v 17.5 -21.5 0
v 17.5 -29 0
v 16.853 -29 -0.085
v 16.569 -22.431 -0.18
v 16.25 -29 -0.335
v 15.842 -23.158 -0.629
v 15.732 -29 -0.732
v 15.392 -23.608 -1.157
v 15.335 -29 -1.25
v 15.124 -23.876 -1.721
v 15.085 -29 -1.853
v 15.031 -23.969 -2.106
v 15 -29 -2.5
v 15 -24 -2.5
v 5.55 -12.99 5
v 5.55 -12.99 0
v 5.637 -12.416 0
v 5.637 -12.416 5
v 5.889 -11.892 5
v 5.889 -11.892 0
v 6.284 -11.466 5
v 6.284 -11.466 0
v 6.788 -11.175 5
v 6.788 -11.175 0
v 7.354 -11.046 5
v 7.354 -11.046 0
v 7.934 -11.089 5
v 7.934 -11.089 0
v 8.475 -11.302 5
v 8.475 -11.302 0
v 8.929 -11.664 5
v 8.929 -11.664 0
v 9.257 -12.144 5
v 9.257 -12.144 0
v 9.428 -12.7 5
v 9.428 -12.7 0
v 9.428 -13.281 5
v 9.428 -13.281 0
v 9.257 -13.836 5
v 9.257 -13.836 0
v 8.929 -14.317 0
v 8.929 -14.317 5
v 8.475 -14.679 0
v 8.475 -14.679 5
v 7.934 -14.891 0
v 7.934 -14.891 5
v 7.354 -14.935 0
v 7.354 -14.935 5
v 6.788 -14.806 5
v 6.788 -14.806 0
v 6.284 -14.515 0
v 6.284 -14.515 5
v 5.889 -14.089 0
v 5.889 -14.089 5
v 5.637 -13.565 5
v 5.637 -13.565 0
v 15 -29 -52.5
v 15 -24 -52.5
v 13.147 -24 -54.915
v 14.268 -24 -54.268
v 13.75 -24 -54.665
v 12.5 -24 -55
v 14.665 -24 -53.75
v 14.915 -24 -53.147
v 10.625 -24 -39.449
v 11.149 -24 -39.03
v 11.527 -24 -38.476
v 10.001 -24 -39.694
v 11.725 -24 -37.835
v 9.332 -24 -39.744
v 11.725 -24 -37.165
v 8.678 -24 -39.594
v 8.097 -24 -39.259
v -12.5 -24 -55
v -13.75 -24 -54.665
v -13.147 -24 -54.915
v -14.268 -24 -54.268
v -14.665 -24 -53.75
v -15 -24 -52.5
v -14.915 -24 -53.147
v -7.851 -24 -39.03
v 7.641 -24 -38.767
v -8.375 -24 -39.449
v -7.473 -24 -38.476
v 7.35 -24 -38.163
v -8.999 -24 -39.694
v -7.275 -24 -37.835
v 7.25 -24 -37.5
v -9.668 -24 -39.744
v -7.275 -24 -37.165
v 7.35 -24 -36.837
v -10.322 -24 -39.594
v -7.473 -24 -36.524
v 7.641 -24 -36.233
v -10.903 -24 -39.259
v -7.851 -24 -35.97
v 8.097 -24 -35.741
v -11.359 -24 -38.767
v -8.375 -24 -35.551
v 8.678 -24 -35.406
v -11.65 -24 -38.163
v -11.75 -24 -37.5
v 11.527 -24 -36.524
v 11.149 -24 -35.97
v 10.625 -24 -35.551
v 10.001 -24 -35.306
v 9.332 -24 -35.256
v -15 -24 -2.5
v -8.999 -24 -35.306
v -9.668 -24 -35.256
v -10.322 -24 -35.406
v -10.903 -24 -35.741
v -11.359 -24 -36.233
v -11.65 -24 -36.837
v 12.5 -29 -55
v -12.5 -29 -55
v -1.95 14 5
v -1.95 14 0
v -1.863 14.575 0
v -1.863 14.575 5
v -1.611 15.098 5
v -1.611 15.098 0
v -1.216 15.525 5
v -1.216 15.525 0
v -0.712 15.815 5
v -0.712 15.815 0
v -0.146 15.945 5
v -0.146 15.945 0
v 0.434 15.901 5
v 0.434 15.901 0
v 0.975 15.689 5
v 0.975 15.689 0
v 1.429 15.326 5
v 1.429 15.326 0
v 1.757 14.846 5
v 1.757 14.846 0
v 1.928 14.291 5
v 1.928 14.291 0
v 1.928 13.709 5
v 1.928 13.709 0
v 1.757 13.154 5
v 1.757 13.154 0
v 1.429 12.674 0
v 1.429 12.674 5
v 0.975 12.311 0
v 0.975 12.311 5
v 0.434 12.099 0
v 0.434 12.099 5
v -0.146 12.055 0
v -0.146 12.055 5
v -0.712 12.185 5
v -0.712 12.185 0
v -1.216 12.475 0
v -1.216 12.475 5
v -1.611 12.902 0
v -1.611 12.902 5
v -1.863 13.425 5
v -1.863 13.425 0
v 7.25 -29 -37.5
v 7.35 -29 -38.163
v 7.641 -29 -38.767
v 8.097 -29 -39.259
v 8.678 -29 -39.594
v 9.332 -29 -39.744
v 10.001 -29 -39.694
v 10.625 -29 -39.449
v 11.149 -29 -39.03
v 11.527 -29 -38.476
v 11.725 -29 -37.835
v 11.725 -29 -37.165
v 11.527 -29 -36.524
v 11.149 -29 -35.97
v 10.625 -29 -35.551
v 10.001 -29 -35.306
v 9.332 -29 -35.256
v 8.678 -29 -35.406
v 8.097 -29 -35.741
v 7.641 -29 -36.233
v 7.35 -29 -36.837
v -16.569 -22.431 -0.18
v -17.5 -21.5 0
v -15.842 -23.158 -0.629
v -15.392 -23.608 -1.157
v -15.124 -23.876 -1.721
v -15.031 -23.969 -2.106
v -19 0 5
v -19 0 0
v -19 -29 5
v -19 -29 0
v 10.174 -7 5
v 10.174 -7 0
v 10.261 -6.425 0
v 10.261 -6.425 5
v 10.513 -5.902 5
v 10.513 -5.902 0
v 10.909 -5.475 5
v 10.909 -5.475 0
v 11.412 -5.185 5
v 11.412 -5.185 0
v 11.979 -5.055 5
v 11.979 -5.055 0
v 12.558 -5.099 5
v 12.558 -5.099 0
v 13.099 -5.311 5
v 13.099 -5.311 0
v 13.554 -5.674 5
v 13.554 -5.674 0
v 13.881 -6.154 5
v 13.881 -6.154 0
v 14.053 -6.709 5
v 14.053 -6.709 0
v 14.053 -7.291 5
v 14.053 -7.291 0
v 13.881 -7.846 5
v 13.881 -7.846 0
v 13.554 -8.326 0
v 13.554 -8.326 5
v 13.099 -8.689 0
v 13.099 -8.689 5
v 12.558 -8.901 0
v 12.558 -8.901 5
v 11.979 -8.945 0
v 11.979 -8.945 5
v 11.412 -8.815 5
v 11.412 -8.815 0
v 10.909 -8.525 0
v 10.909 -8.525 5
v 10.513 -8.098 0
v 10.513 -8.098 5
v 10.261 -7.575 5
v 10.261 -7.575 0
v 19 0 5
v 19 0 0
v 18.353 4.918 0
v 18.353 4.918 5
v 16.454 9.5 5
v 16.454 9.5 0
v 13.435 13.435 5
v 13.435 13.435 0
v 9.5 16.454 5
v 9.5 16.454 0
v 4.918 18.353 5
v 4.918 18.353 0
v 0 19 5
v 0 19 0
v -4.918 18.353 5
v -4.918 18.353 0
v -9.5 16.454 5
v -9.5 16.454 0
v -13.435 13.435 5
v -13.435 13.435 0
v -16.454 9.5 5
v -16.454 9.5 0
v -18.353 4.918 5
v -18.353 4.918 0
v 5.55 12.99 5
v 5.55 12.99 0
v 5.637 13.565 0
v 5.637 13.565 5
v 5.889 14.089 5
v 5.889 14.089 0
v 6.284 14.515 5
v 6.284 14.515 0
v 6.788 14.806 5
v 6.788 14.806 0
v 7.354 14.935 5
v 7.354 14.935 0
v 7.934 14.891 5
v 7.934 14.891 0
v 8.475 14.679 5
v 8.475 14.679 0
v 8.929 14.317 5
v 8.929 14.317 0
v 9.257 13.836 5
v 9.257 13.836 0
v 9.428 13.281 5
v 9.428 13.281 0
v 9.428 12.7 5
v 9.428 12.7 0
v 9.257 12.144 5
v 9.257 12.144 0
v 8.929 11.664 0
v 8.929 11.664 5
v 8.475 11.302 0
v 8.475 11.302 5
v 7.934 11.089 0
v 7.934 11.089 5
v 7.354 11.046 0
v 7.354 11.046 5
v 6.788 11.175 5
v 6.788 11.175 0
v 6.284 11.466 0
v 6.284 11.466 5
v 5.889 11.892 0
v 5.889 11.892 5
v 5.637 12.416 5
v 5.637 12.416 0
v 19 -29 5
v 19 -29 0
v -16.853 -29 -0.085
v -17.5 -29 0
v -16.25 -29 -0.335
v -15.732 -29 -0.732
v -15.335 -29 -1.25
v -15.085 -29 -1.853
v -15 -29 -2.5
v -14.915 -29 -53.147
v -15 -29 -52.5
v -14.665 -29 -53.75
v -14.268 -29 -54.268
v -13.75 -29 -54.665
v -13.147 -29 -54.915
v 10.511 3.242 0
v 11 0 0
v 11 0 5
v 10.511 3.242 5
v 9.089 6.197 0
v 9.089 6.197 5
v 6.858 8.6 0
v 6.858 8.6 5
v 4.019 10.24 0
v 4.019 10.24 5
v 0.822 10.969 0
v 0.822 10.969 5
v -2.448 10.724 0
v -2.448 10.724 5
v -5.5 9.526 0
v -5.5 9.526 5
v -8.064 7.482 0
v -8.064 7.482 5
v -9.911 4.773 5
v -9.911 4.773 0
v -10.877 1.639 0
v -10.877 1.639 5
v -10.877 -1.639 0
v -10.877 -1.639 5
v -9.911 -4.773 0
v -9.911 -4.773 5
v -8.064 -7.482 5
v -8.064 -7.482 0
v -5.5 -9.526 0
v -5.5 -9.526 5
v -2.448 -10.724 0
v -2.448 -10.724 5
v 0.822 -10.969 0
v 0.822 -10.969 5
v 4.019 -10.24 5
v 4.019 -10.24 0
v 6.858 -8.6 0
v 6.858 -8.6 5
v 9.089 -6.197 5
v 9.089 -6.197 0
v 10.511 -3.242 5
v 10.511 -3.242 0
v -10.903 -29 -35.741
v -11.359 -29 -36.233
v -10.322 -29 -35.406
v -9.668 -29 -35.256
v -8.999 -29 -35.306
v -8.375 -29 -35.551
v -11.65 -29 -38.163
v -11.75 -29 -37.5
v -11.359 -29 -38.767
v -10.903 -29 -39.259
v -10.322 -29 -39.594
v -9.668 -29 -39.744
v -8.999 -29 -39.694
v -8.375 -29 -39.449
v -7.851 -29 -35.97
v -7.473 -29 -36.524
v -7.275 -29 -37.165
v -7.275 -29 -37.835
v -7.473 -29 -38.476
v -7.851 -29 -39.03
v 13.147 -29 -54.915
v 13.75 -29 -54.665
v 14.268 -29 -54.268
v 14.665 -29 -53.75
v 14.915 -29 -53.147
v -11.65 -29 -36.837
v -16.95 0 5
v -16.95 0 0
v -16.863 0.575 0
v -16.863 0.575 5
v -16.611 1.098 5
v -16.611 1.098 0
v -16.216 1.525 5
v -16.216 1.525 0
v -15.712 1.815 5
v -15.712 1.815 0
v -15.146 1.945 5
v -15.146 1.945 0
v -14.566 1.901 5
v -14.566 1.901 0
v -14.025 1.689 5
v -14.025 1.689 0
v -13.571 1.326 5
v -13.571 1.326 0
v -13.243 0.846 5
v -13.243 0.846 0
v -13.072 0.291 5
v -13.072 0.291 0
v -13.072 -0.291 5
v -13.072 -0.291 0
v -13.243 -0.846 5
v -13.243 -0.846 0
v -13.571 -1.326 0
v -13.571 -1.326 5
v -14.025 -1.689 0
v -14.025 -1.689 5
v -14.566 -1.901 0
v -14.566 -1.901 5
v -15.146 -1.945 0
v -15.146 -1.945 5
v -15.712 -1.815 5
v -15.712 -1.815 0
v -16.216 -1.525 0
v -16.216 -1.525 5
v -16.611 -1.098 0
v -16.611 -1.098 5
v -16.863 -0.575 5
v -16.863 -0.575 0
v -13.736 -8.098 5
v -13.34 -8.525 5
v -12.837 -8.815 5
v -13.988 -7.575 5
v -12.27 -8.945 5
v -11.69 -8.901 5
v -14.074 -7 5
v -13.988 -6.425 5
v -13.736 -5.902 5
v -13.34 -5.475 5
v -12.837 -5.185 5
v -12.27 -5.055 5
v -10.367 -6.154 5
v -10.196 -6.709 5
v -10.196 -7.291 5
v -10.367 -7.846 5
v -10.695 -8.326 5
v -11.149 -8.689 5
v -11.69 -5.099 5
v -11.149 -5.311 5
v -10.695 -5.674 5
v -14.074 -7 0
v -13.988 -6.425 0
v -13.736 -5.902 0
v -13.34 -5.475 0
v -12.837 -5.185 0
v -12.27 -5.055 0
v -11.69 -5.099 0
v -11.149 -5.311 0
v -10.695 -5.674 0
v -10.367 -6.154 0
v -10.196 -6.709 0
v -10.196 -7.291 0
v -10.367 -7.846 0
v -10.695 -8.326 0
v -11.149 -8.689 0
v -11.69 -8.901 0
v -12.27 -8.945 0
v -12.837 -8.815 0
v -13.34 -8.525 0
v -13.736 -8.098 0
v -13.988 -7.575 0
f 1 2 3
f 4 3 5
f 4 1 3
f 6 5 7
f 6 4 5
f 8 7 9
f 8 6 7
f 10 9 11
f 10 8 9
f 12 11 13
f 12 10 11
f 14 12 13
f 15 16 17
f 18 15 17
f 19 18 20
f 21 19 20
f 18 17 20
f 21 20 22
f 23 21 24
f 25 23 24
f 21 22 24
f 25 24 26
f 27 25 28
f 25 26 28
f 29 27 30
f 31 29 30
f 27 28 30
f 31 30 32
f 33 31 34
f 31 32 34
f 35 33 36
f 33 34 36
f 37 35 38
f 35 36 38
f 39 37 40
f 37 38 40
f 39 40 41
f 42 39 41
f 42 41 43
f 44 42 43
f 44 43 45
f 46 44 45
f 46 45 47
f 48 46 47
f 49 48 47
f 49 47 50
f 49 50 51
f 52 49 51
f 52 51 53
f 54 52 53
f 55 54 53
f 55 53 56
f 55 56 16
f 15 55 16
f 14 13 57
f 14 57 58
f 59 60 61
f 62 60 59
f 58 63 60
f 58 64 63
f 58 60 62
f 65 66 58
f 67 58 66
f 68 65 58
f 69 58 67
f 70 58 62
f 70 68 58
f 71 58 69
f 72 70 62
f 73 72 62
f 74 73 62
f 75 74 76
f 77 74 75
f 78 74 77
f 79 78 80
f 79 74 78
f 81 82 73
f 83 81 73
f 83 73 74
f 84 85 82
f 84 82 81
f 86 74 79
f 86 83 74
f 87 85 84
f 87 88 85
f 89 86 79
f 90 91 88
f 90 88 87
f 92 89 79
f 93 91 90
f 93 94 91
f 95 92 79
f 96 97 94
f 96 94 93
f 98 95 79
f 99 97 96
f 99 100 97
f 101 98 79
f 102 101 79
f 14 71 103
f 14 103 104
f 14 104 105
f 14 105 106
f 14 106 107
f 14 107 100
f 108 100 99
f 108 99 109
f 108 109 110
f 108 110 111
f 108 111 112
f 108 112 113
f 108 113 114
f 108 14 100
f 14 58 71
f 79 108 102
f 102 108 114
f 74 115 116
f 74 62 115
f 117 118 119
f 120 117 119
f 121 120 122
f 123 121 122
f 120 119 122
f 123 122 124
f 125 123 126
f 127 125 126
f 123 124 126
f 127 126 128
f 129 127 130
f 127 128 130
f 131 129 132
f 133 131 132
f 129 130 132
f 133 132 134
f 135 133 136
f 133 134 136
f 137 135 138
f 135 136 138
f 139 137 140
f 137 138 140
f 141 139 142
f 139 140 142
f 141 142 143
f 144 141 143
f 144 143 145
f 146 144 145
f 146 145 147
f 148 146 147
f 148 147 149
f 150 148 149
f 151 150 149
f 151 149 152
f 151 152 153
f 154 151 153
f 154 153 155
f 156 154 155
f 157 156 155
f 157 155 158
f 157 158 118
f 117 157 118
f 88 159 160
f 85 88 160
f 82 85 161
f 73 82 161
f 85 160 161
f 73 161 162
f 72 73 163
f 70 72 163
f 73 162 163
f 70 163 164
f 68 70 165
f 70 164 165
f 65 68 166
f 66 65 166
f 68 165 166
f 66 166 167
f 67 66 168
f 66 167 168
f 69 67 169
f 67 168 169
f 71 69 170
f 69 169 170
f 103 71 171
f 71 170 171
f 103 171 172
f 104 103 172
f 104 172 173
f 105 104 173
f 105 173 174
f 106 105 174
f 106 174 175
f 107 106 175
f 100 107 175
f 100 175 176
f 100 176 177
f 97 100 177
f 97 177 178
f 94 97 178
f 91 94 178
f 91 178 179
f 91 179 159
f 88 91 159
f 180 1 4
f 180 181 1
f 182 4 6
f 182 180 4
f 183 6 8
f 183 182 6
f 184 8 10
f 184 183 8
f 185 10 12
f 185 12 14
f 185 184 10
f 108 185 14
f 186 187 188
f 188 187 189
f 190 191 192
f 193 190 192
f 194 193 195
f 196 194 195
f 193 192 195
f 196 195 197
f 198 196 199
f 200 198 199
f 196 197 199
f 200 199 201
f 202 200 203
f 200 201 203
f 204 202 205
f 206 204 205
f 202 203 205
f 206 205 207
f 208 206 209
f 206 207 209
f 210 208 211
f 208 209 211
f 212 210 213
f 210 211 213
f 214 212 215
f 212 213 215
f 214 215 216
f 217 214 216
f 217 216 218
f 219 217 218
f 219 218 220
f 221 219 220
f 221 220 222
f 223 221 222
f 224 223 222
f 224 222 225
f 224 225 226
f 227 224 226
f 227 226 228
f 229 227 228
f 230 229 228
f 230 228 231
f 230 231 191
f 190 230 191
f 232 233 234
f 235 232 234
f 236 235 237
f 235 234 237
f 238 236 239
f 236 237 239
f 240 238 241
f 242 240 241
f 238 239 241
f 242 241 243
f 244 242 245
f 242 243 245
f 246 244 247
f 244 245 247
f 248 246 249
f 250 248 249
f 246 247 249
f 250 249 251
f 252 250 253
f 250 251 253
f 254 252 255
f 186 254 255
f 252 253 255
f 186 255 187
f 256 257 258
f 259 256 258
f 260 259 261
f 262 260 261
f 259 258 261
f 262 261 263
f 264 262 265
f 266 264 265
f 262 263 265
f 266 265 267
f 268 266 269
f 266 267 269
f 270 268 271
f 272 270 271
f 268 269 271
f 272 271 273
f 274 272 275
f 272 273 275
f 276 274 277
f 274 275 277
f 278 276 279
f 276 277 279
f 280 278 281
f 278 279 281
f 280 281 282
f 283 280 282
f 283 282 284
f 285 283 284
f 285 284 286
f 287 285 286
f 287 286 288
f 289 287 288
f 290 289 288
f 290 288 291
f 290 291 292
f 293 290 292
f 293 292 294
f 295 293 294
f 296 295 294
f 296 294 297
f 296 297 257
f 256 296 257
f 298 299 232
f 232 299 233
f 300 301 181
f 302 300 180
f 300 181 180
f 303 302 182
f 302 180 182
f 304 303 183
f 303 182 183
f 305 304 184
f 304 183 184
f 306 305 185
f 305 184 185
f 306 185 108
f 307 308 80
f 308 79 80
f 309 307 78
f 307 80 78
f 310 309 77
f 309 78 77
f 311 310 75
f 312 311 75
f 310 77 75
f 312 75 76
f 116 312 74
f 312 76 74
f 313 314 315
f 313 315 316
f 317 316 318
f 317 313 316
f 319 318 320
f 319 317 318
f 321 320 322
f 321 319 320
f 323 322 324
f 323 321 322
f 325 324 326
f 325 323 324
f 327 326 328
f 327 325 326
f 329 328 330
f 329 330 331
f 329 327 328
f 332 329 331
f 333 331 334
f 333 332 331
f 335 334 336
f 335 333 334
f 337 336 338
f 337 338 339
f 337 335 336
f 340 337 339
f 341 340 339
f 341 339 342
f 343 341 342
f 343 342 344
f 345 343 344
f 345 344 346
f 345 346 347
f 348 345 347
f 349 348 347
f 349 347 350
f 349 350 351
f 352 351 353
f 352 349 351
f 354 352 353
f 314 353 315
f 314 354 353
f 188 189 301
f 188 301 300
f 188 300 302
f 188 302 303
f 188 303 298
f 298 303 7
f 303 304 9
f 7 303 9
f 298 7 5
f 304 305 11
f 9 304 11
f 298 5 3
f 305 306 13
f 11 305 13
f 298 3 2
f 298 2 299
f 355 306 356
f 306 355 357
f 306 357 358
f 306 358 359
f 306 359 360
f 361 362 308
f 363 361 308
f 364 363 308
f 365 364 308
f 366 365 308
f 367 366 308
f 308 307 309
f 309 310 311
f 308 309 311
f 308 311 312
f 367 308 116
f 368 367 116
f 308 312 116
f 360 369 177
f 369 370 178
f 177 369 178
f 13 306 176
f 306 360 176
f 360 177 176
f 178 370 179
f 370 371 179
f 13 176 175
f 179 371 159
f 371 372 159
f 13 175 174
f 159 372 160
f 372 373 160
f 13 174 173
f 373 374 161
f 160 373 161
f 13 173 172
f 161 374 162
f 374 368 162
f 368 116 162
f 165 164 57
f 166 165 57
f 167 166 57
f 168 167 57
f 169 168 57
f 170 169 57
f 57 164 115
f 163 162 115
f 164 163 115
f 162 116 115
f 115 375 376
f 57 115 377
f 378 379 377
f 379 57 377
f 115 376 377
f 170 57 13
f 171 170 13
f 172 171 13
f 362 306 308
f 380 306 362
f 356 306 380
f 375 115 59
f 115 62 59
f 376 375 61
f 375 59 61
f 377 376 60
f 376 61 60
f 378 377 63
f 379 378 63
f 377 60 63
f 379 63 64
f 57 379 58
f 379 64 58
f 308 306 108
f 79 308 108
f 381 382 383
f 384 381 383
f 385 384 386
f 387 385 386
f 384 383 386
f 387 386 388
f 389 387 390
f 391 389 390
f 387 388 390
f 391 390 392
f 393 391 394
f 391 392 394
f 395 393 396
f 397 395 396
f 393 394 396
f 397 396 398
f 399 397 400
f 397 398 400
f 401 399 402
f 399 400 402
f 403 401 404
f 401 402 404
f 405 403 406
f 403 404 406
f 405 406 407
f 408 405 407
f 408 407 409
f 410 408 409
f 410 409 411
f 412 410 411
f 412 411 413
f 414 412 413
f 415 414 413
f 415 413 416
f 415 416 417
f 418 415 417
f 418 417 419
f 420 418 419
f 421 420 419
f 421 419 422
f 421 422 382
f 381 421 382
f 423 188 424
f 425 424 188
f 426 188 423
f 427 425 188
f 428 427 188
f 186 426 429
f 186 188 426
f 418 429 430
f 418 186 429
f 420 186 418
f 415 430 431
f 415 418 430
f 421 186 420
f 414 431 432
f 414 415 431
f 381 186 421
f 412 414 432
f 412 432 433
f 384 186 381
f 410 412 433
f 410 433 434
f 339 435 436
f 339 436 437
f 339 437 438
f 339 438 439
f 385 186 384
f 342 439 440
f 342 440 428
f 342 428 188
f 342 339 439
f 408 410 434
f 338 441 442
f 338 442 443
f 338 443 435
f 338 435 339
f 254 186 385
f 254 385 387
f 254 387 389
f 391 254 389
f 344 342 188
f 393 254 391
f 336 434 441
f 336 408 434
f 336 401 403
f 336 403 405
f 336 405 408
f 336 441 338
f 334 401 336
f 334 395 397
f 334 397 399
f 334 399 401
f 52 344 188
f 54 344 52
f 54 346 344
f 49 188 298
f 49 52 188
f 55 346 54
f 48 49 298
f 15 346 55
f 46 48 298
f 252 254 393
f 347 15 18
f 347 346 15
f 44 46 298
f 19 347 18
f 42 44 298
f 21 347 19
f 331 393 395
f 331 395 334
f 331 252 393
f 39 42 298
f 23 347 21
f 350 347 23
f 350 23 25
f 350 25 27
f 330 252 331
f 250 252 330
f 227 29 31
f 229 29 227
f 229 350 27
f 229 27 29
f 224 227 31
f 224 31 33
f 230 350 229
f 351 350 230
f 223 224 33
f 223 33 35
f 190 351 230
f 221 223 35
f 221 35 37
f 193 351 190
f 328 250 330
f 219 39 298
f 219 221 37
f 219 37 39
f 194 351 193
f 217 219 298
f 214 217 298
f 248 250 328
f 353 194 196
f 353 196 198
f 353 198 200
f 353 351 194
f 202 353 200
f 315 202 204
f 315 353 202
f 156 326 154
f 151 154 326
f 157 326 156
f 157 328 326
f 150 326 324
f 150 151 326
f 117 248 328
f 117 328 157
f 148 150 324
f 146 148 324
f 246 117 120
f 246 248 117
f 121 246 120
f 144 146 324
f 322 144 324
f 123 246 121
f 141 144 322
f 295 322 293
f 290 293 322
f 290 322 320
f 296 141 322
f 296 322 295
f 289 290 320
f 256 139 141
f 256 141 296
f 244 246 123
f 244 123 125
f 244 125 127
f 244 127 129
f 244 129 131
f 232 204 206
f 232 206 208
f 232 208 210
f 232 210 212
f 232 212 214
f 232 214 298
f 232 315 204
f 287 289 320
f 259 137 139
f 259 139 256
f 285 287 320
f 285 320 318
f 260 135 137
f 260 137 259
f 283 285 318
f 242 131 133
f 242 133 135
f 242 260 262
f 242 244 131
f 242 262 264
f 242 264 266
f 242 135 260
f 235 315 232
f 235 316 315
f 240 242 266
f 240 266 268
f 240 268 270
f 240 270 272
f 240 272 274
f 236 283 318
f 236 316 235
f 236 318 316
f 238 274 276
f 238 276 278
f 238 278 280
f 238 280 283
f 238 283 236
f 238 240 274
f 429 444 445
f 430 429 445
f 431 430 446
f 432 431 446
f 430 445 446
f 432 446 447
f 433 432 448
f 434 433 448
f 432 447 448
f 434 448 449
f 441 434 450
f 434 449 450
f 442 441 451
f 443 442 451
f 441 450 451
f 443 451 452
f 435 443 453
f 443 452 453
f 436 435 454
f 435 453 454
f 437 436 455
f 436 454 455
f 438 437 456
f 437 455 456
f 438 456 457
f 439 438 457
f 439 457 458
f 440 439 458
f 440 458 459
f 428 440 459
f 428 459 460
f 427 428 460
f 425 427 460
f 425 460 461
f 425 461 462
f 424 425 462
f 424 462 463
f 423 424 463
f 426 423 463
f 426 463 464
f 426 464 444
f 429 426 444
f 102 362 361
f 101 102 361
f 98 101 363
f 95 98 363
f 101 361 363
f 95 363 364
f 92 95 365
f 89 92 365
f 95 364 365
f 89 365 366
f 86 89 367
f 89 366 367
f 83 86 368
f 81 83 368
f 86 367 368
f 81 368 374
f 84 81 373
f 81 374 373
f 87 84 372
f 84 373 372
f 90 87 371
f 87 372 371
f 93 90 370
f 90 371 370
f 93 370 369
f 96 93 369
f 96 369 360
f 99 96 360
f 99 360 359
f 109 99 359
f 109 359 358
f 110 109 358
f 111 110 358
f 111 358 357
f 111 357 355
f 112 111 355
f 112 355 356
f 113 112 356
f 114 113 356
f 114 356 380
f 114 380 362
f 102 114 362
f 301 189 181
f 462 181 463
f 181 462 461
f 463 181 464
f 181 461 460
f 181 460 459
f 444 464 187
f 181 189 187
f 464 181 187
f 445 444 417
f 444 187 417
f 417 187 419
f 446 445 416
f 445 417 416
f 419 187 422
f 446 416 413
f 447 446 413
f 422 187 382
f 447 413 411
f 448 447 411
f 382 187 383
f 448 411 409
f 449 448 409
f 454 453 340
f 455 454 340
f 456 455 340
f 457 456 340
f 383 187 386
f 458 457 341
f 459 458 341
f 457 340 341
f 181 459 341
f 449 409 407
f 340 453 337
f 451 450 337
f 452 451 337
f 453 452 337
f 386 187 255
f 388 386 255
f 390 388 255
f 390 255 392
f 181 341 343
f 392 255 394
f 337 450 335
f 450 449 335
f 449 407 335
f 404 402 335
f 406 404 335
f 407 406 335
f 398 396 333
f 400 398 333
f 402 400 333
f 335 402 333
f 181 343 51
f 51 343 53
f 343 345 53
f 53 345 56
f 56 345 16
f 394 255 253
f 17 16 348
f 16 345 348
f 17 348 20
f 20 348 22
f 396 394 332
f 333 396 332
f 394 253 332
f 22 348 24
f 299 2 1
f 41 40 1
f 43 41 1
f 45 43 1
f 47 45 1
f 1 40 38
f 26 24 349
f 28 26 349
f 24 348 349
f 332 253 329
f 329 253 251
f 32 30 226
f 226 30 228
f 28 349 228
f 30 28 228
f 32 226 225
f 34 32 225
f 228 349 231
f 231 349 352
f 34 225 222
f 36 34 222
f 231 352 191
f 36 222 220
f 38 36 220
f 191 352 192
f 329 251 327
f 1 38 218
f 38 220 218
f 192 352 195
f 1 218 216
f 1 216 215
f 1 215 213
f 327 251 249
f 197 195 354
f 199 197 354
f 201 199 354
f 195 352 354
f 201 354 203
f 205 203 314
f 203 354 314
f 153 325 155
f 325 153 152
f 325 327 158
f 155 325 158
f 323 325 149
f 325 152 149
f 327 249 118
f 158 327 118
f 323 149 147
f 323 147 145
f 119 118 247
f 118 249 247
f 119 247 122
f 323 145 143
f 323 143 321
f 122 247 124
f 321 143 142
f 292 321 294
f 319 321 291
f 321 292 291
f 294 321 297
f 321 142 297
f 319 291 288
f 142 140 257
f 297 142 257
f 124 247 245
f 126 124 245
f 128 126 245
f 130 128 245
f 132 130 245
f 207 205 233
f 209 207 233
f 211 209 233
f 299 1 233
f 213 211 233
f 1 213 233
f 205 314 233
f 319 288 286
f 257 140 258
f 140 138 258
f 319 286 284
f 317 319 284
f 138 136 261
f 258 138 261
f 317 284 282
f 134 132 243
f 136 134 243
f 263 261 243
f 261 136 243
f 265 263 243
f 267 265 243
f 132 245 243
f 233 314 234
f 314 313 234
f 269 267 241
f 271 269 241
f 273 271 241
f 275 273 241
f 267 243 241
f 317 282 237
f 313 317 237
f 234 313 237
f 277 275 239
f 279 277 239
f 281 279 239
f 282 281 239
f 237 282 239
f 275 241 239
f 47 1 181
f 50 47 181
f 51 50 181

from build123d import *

# Parameters (mm, degrees)
SKETCH1_R            = 19
SKETCH1_R_2          = 11
BOSS_EXTRUDE1_DEPTH  = 5
SKETCH2_W            = 30
SKETCH2_H            = 5
BOSS_EXTRUDE2_DEPTH  = 55
M3_CLEARANCE_HOLE1_D = 3.9
M4_CLEARANCE_HOLE1_D = 4.5
FILLET1_R            = 2.5


with BuildPart() as part:
    # Sketch1 → Boss-Extrude1 (new body)
    # profile 1 of 2: a face of its own
    with BuildSketch(Plane.XY):
        Circle(SKETCH1_R)
        Circle(SKETCH1_R_2, mode=Mode.SUBTRACT)
    # profile 2 of 2: a face of its own
    with BuildSketch(Plane.XY):
        with BuildLine():
            ThreePointArc((19, 0), (0, -19), (-19, 0))
            Line((-19, 0), (-19, -29))
            Line((-19, -29), (19, -29))
            Line((19, -29), (19, 0))
        make_face()
    extrude(amount=BOSS_EXTRUDE1_DEPTH)

    # Sketch2 → Boss-Extrude2 (add)
    with BuildSketch(Plane(origin=(0, 0, 0), x_dir=(-1, 0, 0), z_dir=(0, 0, -1))):
        with Locations((0, -26.5)):
            Rectangle(SKETCH2_W, SKETCH2_H)
    extrude(amount=BOSS_EXTRUDE2_DEPTH)

    # M3 Clearance Hole1 (through all)
    with Locations(Plane.XY.offset(5)):
        with Locations((-15, 0), (0, 14), (12.124355653, -7), (-12.124355653, -7), (7.5, 12.990381057), (7.5, -12.990381057)):
            Hole(M3_CLEARANCE_HOLE1_D / 2)

    # M4 Clearance Hole1 (through all)
    with Locations(Plane(origin=(0, -24, 0), x_dir=(1, 0, 0), z_dir=(0, 1, 0))):
        with Locations((-9.5, 37.5), (9.5, 37.5)):
            Hole(M4_CLEARANCE_HOLE1_D / 2)

    # Fillet1
    fillet1_edges = [part.edges().sort_by_distance(p)[0] for p in [
        (15, -26.5, 0),
        (-15, -26.5, 0),
        (0, -24, 0),
        (15, -26.5, -55),
        (-15, -26.5, -55),
    ]]
    fillet(fillet1_edges, radius=FILLET1_R)


solid = part.part
